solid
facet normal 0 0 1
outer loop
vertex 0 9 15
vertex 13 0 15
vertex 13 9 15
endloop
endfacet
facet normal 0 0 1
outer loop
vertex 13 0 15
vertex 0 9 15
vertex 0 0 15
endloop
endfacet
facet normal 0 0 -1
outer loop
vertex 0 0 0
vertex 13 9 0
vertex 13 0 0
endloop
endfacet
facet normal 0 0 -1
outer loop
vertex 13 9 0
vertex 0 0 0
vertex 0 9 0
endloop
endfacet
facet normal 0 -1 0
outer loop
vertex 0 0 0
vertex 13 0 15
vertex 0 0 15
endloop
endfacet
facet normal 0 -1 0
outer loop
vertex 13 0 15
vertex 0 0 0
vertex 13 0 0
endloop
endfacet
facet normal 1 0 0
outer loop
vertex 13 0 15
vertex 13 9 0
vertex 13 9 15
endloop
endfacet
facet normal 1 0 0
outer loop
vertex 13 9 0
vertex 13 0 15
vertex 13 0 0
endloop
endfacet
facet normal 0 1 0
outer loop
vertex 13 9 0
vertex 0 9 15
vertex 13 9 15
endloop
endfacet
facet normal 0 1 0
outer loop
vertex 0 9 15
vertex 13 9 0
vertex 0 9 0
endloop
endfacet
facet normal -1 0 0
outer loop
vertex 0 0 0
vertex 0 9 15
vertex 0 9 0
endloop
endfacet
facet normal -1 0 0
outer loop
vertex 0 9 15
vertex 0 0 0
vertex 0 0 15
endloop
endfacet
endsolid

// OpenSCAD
// Generated by SolidPython 1.0.1 on 2020-07-29 00:46:55


cube(size = [13, 9, 15]);
/***********************************************
*********      SolidPython code:      **********
************************************************
 
# import packages: SolidPython
from solid import *
from solid.utils import *
from itertools import chain, combinations, permutations


class Resize:

    def __init__(self, scad_file):
        self.scad_file = scad_file
        #self.scad_file = import_scad(scad_file)
        # cone/cylinder param:
        self.r1 = 0
        self.r2 = 0
        self.h = 0
        # rectangular prism param:
        self.w = 0
        self.l = 0
        # ellipse param:
        self.r = 0

    # import OpenScad code (file name corresponds to shape)


    # classify shape + parameters
    def assign(self, param1, param2, param3):
        if self.scad_file == 'cone.scad':
            self.r1 = param1
            self.r2 = param2
            self.h = param3
        elif self.scad_file == 'cylinder.scad':
            self.r1 = param1
            self.r2 = param2
            self.h = param3
        elif self.scad_file == 'rectangularPrism.scad':
            self.h = param1
            self.l = param2
            self.w = param3
        else:
            self.r = param1
            self.h = param2

    # resize parameters
    def iterate(self):
        x = range(3, 20, 2)
        i = 1
        if self.scad_file == 'cone.scad':
            tempList = list(permutations(x, 2))
            for temp in tempList:
                param1 = temp[0]
                param2 = temp[1]
                filepath = 'produced_scad_files/' + 'cone' + str(param1) + '_' + str(param2) + '_' + '.scad'
                scad_render_to_file(cylinder(h=param1, r1=param2, r2=0), filepath)

        elif self.scad_file == 'cylinder.scad':
            tempList = list(permutations(x, 3))
            for temp in tempList:
                param1 = temp[0]
                param2 = temp[1]
                filepath = 'produced_scad_files/' + 'cylinder' + str(param1) + '_' + str(param2) + '_' + '.scad'
                scad_render_to_file(cylinder(h=param1, r1=param2, r2=param2), filepath)

        elif self.scad_file == 'rectangularPrism.scad':
            tempList = list(permutations(x, 3))
            for temp in tempList:
                param1 = temp[0]
                param2 = temp[1]
                param3 = temp[2]
                filepath = 'produced_scad_files/' + 'rectangularPrism' + str(param1) + '_' + str(param2) + '_' + str(
                    param3) + '.scad'
                scad_render_to_file(cube(size=(param1, param2, param3)), filepath)

        elif self.scad_file == 'ellipse.scad':
            tempList = list(permutations(x, 4))
            for temp in tempList:
                param1 = temp[0]
                param2 = temp[1]
                param3 = temp[2]
                param4 = temp[3]
                filepath = 'produced_scad_files/' + 'ellipse' + str(param1) + '_' + str(param2) + '_' + str(param3) + '_' + str(param4) + '.scad'
                scad_render_to_file(scale([param1, param2, param3])(sphere(r=param4)), filepath)

    def render_to_scadfile(self):
        scad_render_to_file(scad, 'example.scad') 
 
************************************************/
